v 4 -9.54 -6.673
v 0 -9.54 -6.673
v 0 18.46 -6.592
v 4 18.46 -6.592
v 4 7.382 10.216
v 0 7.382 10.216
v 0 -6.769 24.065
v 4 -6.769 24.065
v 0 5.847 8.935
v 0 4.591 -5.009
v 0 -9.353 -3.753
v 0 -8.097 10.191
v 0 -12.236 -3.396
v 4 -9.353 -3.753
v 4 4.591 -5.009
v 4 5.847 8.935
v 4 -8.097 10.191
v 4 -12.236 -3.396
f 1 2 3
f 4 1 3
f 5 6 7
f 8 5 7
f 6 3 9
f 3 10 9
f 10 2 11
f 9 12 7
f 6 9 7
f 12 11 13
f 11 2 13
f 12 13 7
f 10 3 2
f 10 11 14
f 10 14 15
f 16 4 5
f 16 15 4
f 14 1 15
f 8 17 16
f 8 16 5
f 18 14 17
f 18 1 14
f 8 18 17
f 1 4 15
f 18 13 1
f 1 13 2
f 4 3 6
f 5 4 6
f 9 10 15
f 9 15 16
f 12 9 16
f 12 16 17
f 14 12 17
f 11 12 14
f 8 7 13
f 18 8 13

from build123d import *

# Parameters (mm, degrees)
EXTRUDE_1_DEPTH = 4


with BuildPart() as part:
    # Sketch 1 → Бобышка-Вытянуть1 (new body)
    with BuildSketch(Plane(origin=(0, 18.459650088, -6.591530499), x_dir=(-8.942452936584094e-15, -0.6354457681716477, 0.7721455016463832), z_dir=(1, 0, 0))):
        Polygon((0, 0), (20.017301467, -2.12709708), (39.702713782, 0), (21.972488377, 21.671158416), (17.729847698, 21.671467431), align=None)
        Polygon((20.003340082, -0.12714581), (29.833488484, 9.841213252), (19.865129422, 19.671361654), (10.03498102, 9.703002592), align=None, mode=Mode.SUBTRACT)
    extrude(amount=EXTRUDE_1_DEPTH)


solid = part.part
